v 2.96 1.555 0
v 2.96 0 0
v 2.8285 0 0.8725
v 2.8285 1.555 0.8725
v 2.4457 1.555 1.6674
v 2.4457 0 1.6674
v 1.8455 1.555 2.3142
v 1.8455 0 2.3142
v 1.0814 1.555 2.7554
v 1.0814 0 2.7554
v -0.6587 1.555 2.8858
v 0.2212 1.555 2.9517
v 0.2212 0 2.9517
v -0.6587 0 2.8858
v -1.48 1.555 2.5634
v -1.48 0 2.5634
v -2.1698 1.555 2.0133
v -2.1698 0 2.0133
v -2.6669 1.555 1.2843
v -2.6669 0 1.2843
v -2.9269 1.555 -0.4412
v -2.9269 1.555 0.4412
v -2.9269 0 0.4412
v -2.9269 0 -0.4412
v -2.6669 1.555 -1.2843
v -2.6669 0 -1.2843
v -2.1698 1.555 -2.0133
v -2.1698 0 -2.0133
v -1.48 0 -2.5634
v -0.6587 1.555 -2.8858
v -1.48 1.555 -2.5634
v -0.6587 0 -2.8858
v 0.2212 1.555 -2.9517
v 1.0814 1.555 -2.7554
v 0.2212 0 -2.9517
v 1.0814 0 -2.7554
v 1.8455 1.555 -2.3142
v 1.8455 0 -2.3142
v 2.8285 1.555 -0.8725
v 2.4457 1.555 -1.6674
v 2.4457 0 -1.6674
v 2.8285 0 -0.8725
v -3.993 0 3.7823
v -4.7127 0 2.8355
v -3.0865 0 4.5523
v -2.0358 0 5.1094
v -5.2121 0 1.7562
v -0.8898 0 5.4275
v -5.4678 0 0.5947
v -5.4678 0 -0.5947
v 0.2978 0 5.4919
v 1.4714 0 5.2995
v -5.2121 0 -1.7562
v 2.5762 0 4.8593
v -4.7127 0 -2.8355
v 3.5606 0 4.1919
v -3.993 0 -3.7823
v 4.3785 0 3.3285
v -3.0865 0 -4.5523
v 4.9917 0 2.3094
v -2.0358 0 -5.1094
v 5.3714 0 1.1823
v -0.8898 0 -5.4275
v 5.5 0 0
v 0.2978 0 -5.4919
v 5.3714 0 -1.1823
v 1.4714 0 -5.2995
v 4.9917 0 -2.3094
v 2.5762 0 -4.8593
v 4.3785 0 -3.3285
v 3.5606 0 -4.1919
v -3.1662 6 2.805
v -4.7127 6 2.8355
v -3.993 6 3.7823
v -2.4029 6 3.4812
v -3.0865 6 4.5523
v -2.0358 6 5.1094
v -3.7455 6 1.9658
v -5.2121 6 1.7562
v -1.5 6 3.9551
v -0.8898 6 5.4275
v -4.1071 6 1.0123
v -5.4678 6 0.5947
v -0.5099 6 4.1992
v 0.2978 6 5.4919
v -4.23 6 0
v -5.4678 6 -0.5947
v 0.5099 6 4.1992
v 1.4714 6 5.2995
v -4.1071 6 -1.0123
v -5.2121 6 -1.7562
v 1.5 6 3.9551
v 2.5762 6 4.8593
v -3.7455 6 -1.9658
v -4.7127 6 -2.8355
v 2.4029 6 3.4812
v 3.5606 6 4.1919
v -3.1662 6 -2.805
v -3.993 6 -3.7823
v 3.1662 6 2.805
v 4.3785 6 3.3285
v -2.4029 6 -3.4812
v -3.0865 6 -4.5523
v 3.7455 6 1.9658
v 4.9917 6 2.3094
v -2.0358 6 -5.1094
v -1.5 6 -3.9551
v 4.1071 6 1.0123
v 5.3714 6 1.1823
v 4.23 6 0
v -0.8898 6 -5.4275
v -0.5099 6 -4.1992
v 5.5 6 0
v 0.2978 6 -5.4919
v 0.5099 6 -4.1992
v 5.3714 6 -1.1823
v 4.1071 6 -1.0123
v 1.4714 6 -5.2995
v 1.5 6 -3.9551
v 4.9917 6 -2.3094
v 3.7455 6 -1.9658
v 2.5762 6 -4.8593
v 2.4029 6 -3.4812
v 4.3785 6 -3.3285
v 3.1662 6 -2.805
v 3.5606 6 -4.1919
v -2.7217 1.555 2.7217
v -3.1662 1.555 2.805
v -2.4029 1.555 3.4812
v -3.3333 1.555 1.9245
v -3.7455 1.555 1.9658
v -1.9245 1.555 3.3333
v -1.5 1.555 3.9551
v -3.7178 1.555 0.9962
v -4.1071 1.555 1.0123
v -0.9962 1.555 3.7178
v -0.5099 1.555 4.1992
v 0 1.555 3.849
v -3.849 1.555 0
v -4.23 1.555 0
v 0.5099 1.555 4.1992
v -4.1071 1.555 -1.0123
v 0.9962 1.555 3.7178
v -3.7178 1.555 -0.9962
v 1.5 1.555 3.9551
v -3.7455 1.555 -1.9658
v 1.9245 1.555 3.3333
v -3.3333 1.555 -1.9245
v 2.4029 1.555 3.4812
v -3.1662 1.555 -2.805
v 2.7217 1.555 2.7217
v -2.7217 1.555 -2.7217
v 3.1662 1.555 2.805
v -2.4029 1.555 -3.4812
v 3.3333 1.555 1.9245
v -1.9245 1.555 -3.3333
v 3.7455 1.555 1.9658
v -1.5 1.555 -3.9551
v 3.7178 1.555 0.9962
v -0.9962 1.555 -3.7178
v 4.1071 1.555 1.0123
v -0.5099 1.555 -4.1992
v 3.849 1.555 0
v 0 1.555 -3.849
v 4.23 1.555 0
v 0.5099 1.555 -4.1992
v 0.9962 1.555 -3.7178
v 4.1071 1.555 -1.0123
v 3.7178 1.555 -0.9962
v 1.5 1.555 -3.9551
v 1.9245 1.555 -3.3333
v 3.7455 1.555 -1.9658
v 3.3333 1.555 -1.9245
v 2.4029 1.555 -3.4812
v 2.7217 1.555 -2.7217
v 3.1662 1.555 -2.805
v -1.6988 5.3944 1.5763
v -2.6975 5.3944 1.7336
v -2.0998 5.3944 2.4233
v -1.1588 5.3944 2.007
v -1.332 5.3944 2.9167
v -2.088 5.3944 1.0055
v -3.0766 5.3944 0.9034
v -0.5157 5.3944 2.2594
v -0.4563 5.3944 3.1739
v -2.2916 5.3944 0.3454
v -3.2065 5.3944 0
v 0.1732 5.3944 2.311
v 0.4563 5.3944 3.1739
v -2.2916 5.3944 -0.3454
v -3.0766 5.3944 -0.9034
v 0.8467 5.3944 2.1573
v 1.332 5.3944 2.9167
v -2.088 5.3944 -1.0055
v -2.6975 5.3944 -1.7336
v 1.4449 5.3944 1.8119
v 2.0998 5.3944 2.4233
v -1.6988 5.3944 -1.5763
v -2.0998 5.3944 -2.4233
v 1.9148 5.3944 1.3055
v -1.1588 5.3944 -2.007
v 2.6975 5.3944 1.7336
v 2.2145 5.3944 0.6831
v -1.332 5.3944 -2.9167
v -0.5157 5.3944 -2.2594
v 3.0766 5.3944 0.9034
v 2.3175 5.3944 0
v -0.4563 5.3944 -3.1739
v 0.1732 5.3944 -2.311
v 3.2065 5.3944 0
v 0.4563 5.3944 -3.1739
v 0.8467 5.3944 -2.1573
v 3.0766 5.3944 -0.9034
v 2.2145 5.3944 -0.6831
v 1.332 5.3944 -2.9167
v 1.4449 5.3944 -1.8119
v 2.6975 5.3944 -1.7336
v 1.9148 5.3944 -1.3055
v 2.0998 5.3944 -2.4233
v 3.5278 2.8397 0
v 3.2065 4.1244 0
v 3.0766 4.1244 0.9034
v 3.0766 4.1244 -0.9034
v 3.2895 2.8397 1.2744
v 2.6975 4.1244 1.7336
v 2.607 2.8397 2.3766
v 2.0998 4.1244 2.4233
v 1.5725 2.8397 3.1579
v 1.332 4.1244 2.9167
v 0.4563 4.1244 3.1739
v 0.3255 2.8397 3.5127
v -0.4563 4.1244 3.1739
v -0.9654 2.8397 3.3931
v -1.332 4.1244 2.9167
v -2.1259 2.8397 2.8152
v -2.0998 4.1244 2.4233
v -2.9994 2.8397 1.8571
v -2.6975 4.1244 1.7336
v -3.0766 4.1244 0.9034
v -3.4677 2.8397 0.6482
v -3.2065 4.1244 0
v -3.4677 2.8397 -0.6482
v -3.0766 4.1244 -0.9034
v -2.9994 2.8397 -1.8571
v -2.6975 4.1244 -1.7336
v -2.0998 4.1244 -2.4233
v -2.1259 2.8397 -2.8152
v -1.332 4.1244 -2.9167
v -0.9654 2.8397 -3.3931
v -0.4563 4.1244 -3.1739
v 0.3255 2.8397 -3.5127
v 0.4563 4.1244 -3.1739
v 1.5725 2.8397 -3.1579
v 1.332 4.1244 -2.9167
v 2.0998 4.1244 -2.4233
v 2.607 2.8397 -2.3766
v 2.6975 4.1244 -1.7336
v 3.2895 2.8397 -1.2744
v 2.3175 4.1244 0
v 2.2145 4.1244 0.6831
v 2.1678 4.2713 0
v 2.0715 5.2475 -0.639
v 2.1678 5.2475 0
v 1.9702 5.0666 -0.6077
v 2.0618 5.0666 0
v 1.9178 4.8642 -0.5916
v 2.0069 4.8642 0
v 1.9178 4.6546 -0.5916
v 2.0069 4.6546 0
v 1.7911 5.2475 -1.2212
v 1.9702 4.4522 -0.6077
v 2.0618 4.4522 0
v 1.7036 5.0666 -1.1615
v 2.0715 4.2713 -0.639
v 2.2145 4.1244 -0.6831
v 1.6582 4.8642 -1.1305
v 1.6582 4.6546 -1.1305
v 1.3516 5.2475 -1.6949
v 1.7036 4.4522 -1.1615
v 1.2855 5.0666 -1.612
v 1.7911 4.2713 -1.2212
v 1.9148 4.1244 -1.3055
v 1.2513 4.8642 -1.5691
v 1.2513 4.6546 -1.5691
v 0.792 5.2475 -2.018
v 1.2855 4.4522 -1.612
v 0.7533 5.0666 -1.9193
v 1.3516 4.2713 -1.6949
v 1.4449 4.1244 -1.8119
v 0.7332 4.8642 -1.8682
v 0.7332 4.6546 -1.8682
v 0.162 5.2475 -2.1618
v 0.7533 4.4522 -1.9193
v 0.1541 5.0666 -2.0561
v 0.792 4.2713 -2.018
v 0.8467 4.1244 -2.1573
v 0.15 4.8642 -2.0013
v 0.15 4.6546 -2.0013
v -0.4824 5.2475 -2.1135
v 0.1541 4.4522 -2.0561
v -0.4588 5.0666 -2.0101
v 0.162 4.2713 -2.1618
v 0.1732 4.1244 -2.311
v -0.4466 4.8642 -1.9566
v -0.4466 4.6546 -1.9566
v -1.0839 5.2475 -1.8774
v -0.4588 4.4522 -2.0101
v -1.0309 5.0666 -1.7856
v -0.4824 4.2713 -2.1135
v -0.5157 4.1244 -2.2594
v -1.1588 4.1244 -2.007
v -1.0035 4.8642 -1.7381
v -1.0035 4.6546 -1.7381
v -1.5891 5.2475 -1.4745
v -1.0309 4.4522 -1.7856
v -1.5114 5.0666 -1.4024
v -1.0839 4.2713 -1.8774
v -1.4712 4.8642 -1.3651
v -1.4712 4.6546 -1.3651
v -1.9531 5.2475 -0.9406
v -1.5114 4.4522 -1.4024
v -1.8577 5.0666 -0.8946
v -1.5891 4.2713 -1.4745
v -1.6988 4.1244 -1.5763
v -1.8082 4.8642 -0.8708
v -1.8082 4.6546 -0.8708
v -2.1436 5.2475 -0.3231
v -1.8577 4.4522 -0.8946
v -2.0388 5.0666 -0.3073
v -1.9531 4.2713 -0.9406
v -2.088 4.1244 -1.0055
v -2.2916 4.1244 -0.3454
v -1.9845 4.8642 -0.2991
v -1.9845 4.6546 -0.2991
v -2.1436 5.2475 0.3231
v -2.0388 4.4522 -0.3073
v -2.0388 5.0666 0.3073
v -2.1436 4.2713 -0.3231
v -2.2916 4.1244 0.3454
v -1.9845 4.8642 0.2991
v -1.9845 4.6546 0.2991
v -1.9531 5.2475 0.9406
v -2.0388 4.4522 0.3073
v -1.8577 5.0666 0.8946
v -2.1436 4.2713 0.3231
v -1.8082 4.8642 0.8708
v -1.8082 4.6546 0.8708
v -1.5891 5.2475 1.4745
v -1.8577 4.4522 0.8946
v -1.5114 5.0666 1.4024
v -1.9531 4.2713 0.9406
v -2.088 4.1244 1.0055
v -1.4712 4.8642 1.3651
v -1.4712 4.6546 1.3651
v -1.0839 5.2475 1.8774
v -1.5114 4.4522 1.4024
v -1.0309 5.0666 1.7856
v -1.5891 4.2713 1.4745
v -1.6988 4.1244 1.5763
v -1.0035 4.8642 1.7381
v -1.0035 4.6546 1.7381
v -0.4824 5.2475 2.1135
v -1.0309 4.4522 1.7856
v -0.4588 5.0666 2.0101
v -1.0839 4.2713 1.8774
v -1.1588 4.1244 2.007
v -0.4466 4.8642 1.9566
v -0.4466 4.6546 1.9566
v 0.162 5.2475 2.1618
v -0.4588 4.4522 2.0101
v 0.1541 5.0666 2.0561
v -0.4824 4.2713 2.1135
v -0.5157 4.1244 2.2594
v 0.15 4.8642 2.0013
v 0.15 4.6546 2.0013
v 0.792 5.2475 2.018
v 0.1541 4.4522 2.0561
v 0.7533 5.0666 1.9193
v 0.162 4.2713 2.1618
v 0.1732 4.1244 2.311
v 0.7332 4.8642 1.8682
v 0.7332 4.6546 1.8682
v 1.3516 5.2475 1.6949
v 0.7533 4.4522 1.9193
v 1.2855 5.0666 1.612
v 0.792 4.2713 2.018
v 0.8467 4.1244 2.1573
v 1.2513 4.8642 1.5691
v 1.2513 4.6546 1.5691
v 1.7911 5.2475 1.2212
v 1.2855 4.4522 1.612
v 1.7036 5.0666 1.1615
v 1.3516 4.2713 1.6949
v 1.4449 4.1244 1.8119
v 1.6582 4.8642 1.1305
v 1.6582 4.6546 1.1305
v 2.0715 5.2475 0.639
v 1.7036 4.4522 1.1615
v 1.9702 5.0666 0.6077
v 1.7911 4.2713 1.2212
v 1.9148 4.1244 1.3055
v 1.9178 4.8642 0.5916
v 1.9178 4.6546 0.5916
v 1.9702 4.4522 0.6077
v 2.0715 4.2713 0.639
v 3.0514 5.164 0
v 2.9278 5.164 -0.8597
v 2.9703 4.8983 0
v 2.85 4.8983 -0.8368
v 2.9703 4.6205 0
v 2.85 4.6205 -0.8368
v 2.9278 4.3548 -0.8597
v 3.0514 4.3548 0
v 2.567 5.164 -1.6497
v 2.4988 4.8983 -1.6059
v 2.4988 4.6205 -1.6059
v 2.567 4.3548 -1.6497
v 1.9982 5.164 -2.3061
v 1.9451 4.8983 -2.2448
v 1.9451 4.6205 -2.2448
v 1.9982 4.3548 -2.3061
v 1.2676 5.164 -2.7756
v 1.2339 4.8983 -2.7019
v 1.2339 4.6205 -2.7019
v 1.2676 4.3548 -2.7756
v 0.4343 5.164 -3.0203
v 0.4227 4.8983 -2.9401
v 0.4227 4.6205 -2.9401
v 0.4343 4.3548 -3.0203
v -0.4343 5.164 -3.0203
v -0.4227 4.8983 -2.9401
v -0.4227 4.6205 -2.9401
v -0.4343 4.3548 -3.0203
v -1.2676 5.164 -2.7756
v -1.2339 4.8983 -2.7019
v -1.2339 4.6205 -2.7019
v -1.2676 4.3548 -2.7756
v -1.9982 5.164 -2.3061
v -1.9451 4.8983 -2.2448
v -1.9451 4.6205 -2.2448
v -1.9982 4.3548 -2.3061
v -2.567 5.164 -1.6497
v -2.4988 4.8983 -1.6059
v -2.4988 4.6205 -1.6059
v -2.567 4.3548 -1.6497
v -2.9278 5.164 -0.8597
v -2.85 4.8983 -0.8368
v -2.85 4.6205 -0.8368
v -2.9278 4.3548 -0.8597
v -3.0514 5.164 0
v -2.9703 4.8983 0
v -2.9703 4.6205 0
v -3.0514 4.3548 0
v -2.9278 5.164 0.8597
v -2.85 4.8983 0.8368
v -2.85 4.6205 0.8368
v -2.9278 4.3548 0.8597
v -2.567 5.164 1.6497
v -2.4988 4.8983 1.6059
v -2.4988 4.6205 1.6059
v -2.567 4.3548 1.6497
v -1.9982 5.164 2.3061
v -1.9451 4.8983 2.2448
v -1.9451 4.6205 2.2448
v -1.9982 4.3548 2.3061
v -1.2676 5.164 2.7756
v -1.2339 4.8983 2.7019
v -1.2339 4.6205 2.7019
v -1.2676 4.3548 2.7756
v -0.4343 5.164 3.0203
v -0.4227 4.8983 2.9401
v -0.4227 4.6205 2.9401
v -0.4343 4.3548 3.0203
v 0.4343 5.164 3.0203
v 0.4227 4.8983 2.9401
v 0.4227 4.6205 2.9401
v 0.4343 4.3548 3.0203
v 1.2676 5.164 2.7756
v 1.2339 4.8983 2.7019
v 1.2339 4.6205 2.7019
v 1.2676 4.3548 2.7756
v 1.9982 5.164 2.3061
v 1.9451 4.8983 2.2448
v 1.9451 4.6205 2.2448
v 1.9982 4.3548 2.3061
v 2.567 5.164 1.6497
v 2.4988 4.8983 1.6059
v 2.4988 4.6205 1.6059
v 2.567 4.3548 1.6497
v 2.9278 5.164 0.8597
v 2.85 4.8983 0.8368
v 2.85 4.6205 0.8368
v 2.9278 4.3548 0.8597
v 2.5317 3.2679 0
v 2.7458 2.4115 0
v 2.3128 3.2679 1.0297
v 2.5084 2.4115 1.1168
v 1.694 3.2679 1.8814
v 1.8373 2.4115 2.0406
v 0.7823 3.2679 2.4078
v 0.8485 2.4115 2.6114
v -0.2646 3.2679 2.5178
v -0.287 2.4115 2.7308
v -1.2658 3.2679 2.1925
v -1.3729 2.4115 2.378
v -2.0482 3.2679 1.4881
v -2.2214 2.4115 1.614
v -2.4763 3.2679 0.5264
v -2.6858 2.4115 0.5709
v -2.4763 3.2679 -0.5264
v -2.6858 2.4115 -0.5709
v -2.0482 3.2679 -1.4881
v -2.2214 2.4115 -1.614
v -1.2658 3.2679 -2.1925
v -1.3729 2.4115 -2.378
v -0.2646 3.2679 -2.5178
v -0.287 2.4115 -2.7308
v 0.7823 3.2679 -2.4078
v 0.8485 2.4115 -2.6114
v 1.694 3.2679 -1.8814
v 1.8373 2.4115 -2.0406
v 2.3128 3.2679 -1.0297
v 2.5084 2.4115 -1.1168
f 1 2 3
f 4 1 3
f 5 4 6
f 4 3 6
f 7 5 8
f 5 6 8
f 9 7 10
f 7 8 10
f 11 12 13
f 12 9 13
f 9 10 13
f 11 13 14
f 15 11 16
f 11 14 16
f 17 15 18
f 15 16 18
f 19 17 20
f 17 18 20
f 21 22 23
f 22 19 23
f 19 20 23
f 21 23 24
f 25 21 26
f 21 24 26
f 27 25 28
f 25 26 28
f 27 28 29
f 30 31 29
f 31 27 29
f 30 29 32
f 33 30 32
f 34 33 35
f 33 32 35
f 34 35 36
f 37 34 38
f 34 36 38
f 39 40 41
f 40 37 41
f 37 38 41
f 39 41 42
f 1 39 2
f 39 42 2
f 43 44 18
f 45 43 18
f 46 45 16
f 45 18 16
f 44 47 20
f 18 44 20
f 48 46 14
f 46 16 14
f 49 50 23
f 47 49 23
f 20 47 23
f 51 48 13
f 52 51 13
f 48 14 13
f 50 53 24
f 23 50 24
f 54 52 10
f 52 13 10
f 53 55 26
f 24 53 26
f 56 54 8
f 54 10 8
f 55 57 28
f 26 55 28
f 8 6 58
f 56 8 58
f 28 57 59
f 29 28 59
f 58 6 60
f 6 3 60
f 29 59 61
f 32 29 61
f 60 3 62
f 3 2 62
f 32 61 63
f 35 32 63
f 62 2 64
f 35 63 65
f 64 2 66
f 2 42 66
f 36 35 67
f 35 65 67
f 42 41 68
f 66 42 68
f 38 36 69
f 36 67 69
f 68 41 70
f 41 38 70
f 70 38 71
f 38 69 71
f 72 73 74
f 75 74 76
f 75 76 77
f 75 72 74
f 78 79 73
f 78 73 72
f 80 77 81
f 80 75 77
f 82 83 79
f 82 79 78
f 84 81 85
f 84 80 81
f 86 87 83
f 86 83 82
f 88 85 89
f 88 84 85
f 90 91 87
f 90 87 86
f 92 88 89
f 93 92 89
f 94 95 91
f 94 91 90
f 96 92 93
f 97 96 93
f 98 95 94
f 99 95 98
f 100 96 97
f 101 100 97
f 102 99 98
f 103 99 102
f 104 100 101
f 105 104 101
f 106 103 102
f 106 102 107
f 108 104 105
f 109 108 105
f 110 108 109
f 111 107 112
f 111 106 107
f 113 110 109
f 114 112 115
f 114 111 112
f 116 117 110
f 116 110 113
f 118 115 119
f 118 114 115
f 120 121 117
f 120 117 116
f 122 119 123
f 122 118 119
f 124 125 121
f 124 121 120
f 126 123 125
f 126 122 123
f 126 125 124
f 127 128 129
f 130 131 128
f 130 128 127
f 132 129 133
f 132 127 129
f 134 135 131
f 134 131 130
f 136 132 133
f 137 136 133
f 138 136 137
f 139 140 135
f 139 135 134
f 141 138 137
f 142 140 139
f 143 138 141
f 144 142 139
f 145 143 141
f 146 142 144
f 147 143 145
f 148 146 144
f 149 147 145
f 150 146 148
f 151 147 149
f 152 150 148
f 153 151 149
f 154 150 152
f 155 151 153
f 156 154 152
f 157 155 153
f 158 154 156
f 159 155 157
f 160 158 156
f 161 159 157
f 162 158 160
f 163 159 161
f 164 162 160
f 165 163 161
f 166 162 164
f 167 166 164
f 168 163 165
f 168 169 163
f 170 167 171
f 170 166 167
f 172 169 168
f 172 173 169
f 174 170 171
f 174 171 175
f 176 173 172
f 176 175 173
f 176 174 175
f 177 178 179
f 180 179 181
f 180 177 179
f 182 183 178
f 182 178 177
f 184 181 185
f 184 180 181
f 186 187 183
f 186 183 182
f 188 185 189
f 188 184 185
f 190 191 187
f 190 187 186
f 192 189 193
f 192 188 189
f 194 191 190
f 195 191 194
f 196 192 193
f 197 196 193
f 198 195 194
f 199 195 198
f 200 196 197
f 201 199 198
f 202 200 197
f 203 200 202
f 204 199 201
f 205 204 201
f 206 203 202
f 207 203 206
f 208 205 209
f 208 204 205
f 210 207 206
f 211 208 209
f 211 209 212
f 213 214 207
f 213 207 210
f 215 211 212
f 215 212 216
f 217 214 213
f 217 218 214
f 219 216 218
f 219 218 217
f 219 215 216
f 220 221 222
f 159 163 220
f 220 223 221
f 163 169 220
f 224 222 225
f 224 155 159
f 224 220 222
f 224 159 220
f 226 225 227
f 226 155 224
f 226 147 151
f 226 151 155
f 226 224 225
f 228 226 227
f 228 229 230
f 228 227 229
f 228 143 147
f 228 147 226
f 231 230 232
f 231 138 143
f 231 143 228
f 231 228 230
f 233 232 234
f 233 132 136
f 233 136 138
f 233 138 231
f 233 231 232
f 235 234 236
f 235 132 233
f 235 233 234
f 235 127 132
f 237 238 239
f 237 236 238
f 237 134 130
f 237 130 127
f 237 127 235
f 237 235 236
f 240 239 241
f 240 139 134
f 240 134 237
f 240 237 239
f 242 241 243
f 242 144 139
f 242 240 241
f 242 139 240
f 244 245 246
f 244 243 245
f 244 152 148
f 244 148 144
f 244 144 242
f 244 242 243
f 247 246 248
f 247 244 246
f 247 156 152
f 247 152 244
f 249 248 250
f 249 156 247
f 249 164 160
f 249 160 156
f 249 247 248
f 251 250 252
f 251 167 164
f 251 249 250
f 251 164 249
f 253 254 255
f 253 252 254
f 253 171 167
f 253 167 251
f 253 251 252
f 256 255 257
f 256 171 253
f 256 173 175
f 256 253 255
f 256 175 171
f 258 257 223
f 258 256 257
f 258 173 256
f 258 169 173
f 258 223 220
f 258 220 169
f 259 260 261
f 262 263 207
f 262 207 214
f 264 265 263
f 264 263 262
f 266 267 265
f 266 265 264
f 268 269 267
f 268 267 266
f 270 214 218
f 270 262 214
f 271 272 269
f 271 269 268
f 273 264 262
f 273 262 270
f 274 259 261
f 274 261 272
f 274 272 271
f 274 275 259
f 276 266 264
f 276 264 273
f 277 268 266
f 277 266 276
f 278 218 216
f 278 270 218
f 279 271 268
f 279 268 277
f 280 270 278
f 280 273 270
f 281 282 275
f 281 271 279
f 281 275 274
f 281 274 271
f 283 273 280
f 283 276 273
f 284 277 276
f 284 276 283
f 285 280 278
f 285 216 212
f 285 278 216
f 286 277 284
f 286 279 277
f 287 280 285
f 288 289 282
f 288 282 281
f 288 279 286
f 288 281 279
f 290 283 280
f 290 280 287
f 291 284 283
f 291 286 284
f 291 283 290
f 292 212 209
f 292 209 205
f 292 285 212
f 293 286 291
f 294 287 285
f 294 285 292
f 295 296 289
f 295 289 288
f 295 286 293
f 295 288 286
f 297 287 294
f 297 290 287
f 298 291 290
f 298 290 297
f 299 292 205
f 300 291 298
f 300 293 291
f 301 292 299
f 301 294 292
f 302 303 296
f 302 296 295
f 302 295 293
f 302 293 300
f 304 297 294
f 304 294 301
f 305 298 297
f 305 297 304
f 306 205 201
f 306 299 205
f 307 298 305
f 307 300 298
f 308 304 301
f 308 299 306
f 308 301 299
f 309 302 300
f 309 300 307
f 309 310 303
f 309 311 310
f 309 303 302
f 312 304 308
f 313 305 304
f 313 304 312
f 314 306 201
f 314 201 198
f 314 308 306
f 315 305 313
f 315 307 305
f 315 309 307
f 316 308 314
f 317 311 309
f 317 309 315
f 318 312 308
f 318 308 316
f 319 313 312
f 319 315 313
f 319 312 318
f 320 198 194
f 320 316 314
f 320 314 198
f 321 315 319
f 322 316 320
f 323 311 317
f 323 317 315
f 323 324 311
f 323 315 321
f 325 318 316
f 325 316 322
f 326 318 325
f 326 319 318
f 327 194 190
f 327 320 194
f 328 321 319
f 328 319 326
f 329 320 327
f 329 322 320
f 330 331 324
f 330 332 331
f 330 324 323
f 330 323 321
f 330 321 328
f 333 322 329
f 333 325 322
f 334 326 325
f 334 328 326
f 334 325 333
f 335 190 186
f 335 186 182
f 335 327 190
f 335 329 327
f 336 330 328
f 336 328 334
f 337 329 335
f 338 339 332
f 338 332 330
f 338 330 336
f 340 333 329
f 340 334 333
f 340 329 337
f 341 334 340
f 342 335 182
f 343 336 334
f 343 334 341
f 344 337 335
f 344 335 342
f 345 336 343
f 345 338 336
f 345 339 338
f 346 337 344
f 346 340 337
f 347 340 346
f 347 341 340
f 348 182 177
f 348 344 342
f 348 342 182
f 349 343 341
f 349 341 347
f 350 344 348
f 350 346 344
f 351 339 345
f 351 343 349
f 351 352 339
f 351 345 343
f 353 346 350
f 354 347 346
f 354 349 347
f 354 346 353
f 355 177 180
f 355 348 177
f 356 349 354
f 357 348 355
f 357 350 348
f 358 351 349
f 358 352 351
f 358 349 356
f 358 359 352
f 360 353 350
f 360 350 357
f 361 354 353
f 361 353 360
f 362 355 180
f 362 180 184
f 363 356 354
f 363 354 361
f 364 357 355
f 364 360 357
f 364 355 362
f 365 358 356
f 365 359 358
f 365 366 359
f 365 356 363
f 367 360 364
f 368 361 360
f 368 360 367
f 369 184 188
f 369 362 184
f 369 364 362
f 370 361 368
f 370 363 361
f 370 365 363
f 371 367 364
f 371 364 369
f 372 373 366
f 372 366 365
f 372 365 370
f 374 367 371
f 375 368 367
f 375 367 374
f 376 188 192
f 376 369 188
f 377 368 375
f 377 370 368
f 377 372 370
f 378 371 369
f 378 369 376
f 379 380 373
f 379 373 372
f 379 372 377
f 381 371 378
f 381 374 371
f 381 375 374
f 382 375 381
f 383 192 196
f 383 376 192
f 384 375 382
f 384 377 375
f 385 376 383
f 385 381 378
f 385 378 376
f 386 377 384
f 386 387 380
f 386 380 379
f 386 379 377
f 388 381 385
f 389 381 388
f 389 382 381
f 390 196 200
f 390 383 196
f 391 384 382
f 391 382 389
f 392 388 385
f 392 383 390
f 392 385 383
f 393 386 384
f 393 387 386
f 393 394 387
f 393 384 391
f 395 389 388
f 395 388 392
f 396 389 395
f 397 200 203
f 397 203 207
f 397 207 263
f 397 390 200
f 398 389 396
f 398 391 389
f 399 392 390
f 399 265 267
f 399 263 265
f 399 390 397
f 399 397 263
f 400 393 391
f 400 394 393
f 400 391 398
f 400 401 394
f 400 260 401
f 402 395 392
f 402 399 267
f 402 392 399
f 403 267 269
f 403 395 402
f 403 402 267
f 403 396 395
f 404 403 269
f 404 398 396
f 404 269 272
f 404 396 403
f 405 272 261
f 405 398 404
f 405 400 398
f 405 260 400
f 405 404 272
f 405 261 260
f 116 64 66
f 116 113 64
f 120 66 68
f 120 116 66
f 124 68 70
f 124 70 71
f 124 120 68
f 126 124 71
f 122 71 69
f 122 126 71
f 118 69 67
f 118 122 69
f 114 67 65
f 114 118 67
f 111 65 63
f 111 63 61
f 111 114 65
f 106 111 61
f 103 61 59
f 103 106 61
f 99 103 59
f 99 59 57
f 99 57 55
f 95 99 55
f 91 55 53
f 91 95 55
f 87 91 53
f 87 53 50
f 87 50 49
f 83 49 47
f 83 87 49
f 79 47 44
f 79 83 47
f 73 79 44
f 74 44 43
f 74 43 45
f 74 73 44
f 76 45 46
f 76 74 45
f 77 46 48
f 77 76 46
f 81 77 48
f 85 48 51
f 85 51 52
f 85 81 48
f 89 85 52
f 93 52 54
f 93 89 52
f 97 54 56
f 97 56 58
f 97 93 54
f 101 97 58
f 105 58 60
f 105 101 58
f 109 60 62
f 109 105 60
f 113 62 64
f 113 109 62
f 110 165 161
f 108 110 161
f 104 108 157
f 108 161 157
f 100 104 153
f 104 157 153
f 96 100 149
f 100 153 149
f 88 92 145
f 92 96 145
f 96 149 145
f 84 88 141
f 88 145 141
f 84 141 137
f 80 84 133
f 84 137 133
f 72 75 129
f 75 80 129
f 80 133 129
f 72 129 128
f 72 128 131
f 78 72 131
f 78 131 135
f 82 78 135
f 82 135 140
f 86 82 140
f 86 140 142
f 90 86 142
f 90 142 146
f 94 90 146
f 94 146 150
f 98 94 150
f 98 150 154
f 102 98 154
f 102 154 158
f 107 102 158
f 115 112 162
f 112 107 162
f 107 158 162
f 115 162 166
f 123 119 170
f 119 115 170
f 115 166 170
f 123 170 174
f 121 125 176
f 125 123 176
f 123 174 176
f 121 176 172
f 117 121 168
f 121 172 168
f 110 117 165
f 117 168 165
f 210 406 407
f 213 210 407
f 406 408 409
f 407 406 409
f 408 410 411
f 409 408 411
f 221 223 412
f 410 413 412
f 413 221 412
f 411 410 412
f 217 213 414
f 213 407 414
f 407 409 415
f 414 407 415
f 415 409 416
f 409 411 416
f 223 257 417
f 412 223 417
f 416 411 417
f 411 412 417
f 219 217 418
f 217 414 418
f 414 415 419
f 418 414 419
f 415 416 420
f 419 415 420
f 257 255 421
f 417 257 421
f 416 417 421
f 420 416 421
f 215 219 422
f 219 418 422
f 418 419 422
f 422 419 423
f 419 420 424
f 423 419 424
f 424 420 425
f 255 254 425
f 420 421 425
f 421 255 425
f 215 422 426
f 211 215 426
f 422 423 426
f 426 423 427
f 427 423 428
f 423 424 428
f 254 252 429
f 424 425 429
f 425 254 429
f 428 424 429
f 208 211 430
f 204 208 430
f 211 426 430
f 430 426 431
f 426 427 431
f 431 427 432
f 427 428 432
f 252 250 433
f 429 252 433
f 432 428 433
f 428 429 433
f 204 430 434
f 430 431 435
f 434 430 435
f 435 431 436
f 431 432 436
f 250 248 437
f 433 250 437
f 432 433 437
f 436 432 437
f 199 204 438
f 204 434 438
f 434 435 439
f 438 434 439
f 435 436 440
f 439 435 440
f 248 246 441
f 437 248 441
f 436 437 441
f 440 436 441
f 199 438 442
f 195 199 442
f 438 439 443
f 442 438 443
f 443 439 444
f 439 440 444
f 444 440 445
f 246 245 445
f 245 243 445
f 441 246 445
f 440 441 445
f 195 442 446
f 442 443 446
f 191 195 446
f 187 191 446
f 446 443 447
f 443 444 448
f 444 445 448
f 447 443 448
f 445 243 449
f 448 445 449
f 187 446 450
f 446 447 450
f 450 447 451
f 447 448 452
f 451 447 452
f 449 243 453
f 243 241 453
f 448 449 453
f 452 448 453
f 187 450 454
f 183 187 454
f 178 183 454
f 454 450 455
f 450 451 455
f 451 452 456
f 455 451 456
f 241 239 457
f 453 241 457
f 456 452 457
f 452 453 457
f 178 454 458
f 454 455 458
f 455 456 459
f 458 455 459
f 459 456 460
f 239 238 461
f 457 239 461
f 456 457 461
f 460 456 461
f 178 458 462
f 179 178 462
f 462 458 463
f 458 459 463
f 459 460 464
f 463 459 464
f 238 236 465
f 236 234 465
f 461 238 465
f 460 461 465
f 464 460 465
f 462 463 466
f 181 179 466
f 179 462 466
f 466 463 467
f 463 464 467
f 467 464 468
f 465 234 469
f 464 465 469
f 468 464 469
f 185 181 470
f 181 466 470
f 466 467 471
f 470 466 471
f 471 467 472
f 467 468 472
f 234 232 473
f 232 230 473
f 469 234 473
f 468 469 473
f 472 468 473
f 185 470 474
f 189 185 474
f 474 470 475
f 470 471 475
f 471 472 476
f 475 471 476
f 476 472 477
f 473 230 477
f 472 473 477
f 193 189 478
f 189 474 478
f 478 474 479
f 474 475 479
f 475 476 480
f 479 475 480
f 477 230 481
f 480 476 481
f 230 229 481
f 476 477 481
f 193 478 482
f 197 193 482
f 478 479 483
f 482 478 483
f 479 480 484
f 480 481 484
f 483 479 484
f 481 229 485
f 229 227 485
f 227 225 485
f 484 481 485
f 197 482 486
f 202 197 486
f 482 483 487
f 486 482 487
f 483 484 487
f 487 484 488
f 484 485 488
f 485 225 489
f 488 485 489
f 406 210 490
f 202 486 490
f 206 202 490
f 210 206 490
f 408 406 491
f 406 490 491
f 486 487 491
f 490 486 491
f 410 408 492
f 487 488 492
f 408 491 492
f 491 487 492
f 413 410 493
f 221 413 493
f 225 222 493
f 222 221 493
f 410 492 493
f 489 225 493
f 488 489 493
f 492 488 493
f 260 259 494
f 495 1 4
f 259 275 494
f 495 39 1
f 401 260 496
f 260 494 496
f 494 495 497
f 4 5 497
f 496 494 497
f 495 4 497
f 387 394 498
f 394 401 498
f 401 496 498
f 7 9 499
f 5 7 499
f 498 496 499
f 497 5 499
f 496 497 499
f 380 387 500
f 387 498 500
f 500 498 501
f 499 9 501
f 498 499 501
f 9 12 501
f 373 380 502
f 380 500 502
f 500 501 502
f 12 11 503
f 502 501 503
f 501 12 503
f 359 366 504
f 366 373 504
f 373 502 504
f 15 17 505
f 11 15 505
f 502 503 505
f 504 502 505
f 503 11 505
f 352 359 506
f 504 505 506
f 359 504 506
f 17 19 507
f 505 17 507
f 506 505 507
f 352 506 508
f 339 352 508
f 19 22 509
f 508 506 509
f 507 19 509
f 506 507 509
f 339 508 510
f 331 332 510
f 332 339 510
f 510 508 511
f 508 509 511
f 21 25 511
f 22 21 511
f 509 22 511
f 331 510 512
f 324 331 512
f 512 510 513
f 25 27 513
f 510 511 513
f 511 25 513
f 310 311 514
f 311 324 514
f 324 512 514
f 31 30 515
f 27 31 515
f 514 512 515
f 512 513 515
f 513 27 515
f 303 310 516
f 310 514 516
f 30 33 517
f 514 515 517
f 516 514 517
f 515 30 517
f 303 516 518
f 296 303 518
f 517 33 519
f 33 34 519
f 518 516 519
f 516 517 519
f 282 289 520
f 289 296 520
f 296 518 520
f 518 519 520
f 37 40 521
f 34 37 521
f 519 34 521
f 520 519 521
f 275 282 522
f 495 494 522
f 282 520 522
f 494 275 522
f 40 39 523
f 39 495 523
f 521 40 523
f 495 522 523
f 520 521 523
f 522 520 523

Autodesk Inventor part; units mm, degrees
ref_plane "YZ Plane" through (0, 0, 0) normal (1, 0, 0) x (0, 1, 0)
ref_plane "XZ Plane" through (0, 0, 0) normal (0, 1, 0) x (-1, 0, 0)
ref_plane "XY Plane" through (0, 0, 0) normal (0, 0, 1) x (1, 0, 0)
sketch "Sketch1" plane through (0, 0, 0) normal (0, 0, 1) x (1, 0, 0)
  line L0 (0, 0) -> (5.5, 0)
  line L1 (5.5, 0) -> (5.5, 6)
  line L2 (5.5, 6) -> (4.23, 6)
  line L3 (4.23, 6) -> (4.23, 1.555)
  line L4 (0, 4.7594) -> (2, 4.7594)
  line L5 (4.23, 1.555) -> (2.96, 1.555)
  line L6 (2, 4.7594) -> (2, 4.1244)
  line L7 (2, 4.1244) -> (2.3175, 4.1244)
  arc A0 (2.3175, 5.3944) -> (2.3175, 4.1244) centre (2.7937, 4.7594) ccw
  line L8 (2.3175, 4.1244) -> (2.96, 1.555)
  line L9 (2.3175, 5.3944) -> (3.2065, 5.3944)
  arc A1 (3.2065, 5.3944) -> (3.2065, 4.1244) centre (3.9012, 4.7594) ccw
  line L10 (3.2065, 4.1244) -> (3.849, 1.555)
  line L11 (2.96, 1.555) -> (2.96, 0)
  line L12 (0, 0) -> (0, 3.2708)
  dimension "d0" = 5.5
  dimension "d1" = 6
  dimension "d2" = 1.27
  dimension "d3" = 4.445
  dimension "d4" = 2
  dimension "d5" = 1.27
  dimension "d6" = 0.635
  dimension "d7" = 0.3175
  dimension "d8" = 1.27
  dimension "d9" = 0.889
  dimension "d11" = 0.9412
revolve "Revolution1" add sketch "Sketch1" angle 360 about axis through (0, 0, 0) along (0, 1, 0) contours L11 L5 L3 L2 L1 L0 | L8 A0 L9 A1 L10 L5
properties part number "RubberMould"
